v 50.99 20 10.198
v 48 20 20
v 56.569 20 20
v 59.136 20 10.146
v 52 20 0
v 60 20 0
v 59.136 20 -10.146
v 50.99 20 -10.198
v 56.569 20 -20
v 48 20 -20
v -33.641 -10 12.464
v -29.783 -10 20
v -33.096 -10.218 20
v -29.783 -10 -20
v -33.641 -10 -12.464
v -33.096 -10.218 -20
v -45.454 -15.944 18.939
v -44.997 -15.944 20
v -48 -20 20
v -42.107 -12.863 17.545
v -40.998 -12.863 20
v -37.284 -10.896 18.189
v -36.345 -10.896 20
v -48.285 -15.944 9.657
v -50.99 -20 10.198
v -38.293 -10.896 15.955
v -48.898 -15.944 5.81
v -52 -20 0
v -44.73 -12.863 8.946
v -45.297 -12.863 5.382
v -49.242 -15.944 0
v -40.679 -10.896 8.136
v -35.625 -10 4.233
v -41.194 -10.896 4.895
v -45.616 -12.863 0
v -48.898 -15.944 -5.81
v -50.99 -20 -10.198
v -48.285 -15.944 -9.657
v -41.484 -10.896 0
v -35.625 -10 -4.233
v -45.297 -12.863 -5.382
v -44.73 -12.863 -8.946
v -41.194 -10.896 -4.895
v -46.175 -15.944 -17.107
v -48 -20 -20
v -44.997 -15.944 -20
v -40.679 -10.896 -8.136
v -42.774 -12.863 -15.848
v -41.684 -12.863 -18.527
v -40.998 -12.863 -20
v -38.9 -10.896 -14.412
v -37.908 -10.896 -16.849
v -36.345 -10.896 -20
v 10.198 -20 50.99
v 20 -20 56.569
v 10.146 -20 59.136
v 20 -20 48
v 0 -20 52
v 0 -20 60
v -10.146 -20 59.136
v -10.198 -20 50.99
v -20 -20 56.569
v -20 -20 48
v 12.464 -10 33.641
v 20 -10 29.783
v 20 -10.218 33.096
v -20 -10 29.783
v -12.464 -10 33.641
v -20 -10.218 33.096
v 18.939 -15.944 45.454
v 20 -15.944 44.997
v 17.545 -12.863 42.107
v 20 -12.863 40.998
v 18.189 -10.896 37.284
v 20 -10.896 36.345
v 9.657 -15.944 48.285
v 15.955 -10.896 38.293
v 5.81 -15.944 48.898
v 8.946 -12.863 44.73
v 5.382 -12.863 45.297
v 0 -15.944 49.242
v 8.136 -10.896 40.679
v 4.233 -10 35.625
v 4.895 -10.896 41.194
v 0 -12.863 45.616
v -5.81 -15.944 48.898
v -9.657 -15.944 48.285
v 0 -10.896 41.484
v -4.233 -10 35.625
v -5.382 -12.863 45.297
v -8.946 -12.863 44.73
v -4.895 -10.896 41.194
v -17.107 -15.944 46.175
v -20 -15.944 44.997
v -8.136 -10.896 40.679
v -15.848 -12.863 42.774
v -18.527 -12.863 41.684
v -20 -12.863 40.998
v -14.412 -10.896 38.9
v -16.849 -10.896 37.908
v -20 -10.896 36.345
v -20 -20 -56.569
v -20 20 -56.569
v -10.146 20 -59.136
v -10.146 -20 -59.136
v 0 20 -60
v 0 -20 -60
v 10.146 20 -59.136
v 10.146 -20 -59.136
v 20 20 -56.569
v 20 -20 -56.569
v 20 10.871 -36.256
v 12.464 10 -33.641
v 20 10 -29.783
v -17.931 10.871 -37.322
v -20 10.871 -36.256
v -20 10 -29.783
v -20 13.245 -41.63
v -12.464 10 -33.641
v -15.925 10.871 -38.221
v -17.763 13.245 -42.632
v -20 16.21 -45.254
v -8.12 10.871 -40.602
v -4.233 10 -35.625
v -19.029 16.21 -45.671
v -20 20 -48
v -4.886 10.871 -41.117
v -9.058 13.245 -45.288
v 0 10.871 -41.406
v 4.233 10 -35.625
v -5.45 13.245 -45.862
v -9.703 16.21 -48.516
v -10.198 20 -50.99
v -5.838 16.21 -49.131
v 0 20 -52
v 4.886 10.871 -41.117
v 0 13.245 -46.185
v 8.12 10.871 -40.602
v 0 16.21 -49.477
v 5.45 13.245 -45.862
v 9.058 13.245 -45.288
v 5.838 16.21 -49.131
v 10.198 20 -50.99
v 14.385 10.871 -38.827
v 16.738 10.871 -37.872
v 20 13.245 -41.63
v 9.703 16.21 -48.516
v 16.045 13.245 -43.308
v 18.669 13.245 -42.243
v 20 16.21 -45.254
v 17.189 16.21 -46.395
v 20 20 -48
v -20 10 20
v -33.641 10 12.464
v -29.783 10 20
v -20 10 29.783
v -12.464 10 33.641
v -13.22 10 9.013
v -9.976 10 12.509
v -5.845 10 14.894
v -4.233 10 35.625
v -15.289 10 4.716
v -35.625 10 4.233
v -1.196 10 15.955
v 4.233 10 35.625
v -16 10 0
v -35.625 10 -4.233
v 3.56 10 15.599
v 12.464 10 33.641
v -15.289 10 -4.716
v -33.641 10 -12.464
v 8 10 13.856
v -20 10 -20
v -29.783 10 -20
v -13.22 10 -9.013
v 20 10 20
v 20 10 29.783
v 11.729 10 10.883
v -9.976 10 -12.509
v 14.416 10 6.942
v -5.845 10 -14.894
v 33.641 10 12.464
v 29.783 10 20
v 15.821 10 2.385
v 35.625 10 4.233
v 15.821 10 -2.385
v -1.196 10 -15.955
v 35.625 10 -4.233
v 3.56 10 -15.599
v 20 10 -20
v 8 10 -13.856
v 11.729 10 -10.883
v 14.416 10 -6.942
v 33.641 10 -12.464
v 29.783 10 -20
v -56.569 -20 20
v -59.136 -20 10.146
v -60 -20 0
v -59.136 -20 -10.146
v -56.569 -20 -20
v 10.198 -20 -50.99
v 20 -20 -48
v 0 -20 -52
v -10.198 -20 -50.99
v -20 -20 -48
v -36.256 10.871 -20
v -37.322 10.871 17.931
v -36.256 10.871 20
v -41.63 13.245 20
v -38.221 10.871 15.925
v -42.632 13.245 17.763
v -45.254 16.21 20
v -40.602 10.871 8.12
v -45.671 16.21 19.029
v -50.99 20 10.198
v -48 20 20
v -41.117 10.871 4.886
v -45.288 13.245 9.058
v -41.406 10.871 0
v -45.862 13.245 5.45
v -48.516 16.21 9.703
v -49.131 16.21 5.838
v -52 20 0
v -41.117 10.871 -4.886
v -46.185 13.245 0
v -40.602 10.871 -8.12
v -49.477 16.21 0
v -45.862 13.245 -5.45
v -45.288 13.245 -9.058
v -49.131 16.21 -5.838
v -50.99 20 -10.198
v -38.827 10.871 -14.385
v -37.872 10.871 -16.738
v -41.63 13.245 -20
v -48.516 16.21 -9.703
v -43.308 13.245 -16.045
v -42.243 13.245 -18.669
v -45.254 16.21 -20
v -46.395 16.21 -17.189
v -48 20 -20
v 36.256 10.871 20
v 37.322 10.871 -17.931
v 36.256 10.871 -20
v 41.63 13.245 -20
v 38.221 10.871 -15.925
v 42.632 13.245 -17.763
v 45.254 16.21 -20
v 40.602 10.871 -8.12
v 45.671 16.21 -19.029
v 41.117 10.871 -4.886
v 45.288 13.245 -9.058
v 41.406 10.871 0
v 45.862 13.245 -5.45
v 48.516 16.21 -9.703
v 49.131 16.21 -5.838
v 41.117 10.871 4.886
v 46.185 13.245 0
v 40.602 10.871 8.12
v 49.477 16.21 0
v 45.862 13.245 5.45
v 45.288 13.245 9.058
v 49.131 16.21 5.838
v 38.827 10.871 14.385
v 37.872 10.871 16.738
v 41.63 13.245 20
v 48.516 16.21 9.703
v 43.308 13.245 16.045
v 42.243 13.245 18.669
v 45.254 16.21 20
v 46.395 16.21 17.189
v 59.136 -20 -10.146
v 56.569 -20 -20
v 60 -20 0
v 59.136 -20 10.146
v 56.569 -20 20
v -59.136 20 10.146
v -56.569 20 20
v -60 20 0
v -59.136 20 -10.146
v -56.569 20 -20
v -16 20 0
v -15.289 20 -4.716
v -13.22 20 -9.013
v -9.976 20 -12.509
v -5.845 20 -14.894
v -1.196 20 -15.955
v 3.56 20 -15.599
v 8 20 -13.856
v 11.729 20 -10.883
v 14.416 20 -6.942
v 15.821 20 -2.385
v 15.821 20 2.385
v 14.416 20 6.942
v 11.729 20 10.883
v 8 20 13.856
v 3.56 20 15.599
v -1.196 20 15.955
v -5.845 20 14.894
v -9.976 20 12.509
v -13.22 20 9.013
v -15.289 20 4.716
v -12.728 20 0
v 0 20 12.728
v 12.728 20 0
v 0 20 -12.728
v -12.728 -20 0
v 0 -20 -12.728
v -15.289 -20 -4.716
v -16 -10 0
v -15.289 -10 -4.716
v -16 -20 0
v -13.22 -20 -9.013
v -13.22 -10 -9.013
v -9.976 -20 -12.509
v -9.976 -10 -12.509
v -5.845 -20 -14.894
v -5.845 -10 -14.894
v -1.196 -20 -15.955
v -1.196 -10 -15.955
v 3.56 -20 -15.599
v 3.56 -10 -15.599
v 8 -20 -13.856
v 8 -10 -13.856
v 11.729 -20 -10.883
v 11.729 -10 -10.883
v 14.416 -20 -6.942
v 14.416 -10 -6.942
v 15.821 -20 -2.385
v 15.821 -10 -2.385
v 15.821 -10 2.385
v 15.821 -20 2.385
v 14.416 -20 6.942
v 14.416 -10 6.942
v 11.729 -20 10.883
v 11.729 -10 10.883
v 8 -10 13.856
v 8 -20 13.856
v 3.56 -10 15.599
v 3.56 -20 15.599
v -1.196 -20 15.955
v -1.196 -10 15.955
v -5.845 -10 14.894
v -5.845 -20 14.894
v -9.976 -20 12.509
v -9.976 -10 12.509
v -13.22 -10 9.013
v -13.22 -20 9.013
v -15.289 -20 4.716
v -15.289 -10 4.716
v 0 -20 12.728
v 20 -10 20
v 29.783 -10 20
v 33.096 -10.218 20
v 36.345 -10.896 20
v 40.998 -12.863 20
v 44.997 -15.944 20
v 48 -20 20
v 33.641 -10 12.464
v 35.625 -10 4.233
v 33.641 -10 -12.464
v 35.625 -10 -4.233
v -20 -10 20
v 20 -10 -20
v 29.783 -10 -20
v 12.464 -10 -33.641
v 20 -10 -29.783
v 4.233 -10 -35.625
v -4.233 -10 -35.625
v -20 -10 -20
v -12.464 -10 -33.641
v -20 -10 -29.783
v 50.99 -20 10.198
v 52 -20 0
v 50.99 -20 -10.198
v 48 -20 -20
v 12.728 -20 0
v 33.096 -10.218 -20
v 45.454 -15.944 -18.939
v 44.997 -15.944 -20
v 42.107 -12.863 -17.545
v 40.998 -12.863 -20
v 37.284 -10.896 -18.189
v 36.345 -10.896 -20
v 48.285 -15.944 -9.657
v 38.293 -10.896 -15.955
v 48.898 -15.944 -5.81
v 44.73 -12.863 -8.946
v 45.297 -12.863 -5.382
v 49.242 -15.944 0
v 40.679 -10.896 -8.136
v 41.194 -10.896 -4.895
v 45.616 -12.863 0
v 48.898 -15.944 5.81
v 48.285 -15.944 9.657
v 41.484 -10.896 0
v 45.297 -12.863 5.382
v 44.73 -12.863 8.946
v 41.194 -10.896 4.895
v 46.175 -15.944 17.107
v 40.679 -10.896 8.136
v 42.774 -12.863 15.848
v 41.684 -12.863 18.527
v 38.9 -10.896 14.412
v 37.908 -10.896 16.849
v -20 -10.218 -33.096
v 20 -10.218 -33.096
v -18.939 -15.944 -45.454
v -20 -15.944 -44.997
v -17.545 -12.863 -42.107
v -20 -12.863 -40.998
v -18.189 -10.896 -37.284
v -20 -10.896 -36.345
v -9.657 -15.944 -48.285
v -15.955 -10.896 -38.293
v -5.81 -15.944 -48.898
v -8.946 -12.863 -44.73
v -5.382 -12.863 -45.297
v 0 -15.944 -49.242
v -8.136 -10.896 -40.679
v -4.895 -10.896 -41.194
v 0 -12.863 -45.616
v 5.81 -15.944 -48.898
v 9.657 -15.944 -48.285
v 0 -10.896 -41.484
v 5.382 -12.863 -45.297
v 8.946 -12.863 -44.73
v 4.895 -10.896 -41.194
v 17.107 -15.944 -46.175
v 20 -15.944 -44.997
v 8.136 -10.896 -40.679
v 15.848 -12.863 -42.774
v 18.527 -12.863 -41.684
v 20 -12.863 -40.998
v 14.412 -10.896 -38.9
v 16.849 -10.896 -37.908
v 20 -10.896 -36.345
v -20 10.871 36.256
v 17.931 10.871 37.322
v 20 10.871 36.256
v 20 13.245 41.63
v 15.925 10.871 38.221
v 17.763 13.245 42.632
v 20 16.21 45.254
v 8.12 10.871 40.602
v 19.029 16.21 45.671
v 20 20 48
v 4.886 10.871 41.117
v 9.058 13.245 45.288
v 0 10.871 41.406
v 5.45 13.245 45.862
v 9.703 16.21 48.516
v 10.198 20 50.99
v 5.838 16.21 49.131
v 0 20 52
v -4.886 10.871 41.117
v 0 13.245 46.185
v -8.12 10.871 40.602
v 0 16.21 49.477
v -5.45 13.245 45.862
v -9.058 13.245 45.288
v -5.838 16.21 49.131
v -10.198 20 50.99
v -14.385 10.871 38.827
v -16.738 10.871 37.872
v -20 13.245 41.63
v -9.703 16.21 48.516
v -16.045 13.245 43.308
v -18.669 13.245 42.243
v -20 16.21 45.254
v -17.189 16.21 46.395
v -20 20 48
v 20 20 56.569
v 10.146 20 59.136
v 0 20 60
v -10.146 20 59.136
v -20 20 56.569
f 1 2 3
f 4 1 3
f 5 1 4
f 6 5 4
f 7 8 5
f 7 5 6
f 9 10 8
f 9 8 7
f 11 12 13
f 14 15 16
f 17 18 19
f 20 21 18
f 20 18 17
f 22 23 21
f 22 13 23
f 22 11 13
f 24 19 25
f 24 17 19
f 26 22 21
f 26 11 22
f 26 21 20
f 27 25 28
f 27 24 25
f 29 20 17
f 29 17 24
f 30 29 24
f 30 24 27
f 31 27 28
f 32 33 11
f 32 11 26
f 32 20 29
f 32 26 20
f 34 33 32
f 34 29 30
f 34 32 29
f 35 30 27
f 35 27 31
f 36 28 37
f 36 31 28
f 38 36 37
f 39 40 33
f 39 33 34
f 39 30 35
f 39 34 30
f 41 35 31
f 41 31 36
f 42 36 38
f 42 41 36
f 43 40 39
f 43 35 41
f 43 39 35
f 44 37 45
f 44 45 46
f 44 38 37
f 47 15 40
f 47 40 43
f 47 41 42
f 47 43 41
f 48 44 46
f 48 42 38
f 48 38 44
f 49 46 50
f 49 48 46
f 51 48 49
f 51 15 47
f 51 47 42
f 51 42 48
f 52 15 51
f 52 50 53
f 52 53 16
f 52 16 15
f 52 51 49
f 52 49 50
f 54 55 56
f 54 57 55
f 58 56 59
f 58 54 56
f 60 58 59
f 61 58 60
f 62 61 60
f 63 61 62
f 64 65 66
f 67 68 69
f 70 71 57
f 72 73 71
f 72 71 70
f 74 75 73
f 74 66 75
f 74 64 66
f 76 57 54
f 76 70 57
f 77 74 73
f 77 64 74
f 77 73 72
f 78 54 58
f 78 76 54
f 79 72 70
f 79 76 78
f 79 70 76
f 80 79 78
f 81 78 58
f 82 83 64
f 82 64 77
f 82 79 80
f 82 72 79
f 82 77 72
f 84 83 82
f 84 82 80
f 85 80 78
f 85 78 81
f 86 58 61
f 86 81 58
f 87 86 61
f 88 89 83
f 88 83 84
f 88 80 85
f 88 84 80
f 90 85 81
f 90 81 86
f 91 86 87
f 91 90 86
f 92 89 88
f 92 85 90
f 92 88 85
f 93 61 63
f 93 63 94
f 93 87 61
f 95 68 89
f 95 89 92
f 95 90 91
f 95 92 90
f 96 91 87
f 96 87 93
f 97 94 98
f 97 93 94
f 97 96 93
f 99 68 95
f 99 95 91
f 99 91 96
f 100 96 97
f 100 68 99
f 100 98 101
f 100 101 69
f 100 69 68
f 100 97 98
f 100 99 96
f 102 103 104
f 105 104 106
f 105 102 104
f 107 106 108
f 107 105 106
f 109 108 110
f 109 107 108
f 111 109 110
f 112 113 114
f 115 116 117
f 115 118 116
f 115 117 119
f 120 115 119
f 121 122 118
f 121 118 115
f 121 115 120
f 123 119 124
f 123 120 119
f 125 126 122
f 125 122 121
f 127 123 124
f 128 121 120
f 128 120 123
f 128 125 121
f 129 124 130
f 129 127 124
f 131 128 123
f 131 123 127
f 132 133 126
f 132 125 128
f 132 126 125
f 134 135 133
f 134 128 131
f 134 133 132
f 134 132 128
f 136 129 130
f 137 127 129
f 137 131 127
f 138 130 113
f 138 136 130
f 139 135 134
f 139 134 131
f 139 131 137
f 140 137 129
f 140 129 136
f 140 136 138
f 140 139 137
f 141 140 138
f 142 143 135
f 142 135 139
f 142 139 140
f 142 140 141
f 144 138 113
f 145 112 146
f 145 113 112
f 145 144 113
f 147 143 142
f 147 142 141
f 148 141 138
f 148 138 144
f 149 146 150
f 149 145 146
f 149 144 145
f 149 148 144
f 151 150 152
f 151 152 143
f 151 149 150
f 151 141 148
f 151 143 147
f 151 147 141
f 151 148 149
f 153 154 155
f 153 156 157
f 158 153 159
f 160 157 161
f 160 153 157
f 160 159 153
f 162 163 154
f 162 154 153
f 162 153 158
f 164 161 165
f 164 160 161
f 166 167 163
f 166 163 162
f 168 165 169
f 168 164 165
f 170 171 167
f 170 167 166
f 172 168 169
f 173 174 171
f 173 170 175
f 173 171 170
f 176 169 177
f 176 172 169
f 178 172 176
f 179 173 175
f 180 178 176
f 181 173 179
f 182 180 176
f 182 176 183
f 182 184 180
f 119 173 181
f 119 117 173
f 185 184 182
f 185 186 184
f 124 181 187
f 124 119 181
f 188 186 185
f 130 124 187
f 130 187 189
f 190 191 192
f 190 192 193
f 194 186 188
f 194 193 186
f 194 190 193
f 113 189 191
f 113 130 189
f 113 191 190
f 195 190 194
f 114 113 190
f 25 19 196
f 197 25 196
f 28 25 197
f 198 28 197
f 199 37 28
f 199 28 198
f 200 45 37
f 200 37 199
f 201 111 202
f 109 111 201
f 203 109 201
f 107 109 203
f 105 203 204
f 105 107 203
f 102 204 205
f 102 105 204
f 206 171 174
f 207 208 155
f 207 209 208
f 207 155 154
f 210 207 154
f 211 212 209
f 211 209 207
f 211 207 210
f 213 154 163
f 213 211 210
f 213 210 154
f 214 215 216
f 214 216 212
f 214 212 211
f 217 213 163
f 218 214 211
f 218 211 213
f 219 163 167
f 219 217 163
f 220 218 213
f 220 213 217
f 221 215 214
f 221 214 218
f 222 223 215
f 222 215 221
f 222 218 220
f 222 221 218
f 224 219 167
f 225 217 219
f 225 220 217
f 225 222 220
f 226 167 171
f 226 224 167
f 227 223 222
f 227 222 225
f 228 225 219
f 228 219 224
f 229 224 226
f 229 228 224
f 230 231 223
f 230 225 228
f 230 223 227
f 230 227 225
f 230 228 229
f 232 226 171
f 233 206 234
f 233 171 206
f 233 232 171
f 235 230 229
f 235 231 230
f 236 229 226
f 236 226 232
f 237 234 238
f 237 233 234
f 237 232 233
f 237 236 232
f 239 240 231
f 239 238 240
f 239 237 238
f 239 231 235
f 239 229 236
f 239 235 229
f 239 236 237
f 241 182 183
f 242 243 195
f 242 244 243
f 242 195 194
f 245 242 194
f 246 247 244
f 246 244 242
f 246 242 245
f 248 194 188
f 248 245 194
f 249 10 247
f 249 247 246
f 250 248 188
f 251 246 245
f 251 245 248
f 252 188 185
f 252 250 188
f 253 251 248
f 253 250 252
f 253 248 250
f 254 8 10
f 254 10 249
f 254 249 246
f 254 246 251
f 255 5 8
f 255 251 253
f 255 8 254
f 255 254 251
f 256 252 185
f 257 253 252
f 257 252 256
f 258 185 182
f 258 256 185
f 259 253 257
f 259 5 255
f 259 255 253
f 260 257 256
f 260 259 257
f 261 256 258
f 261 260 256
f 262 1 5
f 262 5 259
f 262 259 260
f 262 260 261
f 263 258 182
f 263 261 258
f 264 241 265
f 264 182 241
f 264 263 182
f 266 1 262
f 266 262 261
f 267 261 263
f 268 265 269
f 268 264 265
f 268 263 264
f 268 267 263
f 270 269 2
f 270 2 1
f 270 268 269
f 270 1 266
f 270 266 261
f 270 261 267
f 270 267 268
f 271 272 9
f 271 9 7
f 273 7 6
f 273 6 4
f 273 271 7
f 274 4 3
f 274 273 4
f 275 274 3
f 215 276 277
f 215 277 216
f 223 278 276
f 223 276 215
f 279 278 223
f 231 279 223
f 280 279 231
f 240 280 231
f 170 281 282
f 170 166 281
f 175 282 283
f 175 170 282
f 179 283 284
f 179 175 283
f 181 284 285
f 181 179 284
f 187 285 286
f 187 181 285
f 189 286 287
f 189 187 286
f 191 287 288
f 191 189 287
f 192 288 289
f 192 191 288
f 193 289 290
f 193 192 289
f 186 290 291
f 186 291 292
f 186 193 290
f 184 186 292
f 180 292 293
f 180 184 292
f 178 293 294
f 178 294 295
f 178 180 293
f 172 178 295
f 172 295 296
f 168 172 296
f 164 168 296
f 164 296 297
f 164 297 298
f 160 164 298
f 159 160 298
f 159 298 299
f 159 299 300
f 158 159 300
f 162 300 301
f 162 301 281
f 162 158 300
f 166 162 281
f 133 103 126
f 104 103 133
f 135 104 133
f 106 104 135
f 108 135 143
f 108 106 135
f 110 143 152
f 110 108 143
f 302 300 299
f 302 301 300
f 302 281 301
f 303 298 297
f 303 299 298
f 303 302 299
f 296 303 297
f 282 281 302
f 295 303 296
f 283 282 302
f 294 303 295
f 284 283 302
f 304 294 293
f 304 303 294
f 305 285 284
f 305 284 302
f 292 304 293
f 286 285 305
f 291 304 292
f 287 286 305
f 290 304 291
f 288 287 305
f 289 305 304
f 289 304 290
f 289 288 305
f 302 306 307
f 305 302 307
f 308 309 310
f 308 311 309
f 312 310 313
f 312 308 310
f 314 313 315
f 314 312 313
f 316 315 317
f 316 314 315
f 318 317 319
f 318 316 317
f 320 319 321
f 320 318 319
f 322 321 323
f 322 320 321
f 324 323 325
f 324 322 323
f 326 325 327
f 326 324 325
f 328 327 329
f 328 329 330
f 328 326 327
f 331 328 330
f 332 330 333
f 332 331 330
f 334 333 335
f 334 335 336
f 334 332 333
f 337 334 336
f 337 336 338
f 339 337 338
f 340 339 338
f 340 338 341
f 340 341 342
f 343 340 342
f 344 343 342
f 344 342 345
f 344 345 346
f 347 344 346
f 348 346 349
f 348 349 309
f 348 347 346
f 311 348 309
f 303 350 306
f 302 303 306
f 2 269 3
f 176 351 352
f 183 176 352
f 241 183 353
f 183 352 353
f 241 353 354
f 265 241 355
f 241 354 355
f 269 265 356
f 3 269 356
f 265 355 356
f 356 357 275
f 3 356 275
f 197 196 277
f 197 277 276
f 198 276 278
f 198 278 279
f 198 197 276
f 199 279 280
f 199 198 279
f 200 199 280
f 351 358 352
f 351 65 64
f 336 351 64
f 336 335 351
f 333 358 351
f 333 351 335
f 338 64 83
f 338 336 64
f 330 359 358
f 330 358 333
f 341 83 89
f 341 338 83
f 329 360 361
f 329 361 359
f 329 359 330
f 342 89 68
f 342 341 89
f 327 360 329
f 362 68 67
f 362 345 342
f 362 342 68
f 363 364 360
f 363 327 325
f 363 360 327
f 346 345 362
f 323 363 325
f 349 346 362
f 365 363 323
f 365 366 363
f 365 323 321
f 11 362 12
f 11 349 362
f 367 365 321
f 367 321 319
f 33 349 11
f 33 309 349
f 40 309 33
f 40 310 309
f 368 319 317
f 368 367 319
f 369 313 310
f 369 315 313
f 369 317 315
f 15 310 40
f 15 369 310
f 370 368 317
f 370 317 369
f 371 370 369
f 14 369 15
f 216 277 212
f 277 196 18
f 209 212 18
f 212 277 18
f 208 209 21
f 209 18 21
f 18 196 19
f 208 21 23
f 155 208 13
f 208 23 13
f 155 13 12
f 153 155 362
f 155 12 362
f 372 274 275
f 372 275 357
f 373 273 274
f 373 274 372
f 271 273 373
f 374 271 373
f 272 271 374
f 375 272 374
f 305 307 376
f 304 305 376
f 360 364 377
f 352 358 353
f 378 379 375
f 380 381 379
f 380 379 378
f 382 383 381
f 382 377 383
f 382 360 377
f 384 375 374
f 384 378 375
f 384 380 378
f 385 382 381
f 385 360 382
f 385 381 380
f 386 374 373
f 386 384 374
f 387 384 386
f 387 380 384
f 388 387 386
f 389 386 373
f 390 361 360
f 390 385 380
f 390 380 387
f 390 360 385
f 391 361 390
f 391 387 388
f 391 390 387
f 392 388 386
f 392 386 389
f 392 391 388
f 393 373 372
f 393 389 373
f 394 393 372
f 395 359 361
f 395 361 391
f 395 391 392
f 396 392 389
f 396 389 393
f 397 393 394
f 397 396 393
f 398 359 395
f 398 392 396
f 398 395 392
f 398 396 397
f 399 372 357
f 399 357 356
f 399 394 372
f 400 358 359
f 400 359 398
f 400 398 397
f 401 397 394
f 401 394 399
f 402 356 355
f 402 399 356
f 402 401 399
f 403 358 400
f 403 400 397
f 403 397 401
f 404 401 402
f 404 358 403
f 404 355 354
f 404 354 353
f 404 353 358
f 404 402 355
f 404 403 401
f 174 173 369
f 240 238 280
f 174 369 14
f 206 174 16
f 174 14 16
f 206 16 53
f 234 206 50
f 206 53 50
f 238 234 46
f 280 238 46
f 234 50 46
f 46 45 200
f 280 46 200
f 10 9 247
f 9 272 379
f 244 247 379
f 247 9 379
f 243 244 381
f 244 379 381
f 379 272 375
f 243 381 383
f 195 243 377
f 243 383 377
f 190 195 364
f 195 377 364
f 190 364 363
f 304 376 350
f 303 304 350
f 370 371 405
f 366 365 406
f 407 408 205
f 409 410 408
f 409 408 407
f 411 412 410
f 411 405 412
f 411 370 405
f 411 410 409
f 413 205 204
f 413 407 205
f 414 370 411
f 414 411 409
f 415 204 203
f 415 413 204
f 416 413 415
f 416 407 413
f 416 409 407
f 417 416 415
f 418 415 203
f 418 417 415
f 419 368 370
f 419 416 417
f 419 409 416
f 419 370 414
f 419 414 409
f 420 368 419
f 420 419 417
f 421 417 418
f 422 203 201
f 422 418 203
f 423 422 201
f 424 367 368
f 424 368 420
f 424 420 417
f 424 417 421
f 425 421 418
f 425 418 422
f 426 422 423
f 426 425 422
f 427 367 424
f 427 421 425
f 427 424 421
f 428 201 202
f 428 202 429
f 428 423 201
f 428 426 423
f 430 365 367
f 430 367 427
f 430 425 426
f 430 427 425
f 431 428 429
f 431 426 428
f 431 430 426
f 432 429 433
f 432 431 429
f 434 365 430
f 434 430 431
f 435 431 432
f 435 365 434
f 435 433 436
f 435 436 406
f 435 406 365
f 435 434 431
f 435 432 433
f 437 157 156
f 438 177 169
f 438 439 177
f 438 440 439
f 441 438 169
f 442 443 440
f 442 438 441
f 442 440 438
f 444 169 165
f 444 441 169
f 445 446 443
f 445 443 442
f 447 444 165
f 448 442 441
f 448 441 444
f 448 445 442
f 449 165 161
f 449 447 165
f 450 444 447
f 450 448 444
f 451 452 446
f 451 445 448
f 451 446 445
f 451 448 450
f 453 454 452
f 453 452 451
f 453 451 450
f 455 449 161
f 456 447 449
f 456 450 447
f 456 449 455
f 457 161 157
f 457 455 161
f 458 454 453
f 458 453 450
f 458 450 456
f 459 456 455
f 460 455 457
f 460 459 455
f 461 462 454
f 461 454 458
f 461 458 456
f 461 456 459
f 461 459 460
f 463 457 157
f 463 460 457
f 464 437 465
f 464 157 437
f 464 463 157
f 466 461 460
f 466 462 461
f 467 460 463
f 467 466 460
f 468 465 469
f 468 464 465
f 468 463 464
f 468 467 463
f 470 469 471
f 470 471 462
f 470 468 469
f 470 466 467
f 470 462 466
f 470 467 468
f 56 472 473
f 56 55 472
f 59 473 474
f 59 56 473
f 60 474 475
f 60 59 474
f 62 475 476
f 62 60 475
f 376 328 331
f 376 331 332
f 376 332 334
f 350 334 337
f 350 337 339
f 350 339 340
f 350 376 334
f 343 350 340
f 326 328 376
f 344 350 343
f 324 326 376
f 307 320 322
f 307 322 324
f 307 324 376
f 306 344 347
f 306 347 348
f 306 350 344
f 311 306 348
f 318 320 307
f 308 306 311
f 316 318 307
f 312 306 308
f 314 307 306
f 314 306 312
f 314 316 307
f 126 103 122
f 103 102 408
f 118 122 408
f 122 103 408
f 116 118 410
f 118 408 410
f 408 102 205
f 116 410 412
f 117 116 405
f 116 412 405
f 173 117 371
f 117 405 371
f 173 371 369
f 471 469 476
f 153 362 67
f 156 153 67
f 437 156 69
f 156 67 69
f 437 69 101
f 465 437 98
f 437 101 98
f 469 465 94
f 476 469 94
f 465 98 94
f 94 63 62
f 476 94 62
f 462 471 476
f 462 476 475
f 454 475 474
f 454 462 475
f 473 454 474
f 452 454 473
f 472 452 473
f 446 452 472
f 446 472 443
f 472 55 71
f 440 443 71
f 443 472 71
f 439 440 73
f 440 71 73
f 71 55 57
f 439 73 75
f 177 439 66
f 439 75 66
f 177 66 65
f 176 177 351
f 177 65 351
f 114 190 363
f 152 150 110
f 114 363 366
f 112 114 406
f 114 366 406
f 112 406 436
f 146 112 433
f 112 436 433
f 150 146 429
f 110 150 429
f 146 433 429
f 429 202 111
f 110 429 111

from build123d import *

# Parameters (mm, degrees)
F3_DEPTH = 40.001
F5_DEPTH = 40.0010001


with BuildPart() as f1:
    # F0 (on Top) → F1 (revolve)
    with BuildSketch(Plane.XY):
        with BuildLine():
            Line((-60, 20), (-60, 10))
            Line((-60, 10), (-60, -10))
            Line((-60, -10), (-60, -20))
            Line((-60, -20), (-52, -20))
            ThreePointArc((-52, -20), (-45.3623174839, -12.7029414592), (-35.8754845034, -10))
            Line((-35.8754845034, -10), (-16, -10))
            Line((-16, -10), (-16, -20))
            Line((-16, -20), (0, -20))
            Line((0, -20), (0, 20))
            Line((0, 20), (-16, 20))
            Line((-16, 20), (-16, 10))
            Line((-16, 10), (-35.8754845034, 10))
            ThreePointArc((-35.8754845034, 10), (-45.3623174839, 12.7029414592), (-52, 20))
            Line((-52, 20), (-60, 20))
        make_face()
    revolve(axis=Axis((0, 0.0902060419, 0), (0, -1, 0)))

    # F2 (on face) → F3 (cut, through all)
    with BuildSketch(Plane.XZ.offset(20)):
        with BuildLine():
            Line((48, 20), (56.5685424949, 20))
            ThreePointArc((56.5685424949, 20), (42.4264068712, 42.4264068712), (20, 56.5685424949))
            Line((20, 56.5685424949), (20, 48))
            ThreePointArc((20, 48), (36.7695526217, 36.7695526217), (48, 20))
        make_face()
        with BuildLine():
            Line((20, 20), (48, 20))
            ThreePointArc((48, 20), (36.7695526217, 36.7695526217), (20, 48))
            Line((20, 48), (20, 20))
        make_face()
        with BuildLine():
            Line((-20, 20), (-20, 48))
            ThreePointArc((-20, 48), (-36.7695526217, 36.7695526217), (-48, 20))
            Line((-48, 20), (-20, 20))
        make_face()
        with BuildLine():
            Line((-20, 48), (-20, 56.5685424949))
            ThreePointArc((-20, 56.5685424949), (-42.4264068712, 42.4264068712), (-56.5685424949, 20))
            Line((-56.5685424949, 20), (-48, 20))
            ThreePointArc((-48, 20), (-36.7695526217, 36.7695526217), (-20, 48))
        make_face()
        with BuildLine():
            ThreePointArc((-56.5685424949, -20), (-42.4264068712, -42.4264068712), (-20, -56.5685424949))
            Line((-20, -56.5685424949), (-20, -48))
            ThreePointArc((-20, -48), (-36.7695526217, -36.7695526217), (-48, -20))
            Line((-48, -20), (-56.5685424949, -20))
        make_face()
        with BuildLine():
            ThreePointArc((-48, -20), (-36.7695526217, -36.7695526217), (-20, -48))
            Line((-20, -48), (-20, -20))
            Line((-20, -20), (-48, -20))
        make_face()
        with BuildLine():
            ThreePointArc((20, -56.5685424949), (42.4264068712, -42.4264068712), (56.5685424949, -20))
            Line((56.5685424949, -20), (48, -20))
            ThreePointArc((48, -20), (36.7695526217, -36.7695526217), (20, -48))
            Line((20, -48), (20, -56.5685424949))
        make_face()
        with BuildLine():
            ThreePointArc((20, -48), (36.7695526217, -36.7695526217), (48, -20))
            Line((48, -20), (20, -20))
            Line((20, -20), (20, -48))
        make_face()
    extrude(amount=-F3_DEPTH, mode=Mode.SUBTRACT)

    # F4 (on face) → F5 (cut, through all)
    with BuildSketch(Plane.XZ.offset(20)):
        Polygon((0, -12.7279), (12.7279, 0), (0, 12.7279), (-12.7279, 0), align=None)
    extrude(amount=-F5_DEPTH, mode=Mode.SUBTRACT)


solid = f1.part
